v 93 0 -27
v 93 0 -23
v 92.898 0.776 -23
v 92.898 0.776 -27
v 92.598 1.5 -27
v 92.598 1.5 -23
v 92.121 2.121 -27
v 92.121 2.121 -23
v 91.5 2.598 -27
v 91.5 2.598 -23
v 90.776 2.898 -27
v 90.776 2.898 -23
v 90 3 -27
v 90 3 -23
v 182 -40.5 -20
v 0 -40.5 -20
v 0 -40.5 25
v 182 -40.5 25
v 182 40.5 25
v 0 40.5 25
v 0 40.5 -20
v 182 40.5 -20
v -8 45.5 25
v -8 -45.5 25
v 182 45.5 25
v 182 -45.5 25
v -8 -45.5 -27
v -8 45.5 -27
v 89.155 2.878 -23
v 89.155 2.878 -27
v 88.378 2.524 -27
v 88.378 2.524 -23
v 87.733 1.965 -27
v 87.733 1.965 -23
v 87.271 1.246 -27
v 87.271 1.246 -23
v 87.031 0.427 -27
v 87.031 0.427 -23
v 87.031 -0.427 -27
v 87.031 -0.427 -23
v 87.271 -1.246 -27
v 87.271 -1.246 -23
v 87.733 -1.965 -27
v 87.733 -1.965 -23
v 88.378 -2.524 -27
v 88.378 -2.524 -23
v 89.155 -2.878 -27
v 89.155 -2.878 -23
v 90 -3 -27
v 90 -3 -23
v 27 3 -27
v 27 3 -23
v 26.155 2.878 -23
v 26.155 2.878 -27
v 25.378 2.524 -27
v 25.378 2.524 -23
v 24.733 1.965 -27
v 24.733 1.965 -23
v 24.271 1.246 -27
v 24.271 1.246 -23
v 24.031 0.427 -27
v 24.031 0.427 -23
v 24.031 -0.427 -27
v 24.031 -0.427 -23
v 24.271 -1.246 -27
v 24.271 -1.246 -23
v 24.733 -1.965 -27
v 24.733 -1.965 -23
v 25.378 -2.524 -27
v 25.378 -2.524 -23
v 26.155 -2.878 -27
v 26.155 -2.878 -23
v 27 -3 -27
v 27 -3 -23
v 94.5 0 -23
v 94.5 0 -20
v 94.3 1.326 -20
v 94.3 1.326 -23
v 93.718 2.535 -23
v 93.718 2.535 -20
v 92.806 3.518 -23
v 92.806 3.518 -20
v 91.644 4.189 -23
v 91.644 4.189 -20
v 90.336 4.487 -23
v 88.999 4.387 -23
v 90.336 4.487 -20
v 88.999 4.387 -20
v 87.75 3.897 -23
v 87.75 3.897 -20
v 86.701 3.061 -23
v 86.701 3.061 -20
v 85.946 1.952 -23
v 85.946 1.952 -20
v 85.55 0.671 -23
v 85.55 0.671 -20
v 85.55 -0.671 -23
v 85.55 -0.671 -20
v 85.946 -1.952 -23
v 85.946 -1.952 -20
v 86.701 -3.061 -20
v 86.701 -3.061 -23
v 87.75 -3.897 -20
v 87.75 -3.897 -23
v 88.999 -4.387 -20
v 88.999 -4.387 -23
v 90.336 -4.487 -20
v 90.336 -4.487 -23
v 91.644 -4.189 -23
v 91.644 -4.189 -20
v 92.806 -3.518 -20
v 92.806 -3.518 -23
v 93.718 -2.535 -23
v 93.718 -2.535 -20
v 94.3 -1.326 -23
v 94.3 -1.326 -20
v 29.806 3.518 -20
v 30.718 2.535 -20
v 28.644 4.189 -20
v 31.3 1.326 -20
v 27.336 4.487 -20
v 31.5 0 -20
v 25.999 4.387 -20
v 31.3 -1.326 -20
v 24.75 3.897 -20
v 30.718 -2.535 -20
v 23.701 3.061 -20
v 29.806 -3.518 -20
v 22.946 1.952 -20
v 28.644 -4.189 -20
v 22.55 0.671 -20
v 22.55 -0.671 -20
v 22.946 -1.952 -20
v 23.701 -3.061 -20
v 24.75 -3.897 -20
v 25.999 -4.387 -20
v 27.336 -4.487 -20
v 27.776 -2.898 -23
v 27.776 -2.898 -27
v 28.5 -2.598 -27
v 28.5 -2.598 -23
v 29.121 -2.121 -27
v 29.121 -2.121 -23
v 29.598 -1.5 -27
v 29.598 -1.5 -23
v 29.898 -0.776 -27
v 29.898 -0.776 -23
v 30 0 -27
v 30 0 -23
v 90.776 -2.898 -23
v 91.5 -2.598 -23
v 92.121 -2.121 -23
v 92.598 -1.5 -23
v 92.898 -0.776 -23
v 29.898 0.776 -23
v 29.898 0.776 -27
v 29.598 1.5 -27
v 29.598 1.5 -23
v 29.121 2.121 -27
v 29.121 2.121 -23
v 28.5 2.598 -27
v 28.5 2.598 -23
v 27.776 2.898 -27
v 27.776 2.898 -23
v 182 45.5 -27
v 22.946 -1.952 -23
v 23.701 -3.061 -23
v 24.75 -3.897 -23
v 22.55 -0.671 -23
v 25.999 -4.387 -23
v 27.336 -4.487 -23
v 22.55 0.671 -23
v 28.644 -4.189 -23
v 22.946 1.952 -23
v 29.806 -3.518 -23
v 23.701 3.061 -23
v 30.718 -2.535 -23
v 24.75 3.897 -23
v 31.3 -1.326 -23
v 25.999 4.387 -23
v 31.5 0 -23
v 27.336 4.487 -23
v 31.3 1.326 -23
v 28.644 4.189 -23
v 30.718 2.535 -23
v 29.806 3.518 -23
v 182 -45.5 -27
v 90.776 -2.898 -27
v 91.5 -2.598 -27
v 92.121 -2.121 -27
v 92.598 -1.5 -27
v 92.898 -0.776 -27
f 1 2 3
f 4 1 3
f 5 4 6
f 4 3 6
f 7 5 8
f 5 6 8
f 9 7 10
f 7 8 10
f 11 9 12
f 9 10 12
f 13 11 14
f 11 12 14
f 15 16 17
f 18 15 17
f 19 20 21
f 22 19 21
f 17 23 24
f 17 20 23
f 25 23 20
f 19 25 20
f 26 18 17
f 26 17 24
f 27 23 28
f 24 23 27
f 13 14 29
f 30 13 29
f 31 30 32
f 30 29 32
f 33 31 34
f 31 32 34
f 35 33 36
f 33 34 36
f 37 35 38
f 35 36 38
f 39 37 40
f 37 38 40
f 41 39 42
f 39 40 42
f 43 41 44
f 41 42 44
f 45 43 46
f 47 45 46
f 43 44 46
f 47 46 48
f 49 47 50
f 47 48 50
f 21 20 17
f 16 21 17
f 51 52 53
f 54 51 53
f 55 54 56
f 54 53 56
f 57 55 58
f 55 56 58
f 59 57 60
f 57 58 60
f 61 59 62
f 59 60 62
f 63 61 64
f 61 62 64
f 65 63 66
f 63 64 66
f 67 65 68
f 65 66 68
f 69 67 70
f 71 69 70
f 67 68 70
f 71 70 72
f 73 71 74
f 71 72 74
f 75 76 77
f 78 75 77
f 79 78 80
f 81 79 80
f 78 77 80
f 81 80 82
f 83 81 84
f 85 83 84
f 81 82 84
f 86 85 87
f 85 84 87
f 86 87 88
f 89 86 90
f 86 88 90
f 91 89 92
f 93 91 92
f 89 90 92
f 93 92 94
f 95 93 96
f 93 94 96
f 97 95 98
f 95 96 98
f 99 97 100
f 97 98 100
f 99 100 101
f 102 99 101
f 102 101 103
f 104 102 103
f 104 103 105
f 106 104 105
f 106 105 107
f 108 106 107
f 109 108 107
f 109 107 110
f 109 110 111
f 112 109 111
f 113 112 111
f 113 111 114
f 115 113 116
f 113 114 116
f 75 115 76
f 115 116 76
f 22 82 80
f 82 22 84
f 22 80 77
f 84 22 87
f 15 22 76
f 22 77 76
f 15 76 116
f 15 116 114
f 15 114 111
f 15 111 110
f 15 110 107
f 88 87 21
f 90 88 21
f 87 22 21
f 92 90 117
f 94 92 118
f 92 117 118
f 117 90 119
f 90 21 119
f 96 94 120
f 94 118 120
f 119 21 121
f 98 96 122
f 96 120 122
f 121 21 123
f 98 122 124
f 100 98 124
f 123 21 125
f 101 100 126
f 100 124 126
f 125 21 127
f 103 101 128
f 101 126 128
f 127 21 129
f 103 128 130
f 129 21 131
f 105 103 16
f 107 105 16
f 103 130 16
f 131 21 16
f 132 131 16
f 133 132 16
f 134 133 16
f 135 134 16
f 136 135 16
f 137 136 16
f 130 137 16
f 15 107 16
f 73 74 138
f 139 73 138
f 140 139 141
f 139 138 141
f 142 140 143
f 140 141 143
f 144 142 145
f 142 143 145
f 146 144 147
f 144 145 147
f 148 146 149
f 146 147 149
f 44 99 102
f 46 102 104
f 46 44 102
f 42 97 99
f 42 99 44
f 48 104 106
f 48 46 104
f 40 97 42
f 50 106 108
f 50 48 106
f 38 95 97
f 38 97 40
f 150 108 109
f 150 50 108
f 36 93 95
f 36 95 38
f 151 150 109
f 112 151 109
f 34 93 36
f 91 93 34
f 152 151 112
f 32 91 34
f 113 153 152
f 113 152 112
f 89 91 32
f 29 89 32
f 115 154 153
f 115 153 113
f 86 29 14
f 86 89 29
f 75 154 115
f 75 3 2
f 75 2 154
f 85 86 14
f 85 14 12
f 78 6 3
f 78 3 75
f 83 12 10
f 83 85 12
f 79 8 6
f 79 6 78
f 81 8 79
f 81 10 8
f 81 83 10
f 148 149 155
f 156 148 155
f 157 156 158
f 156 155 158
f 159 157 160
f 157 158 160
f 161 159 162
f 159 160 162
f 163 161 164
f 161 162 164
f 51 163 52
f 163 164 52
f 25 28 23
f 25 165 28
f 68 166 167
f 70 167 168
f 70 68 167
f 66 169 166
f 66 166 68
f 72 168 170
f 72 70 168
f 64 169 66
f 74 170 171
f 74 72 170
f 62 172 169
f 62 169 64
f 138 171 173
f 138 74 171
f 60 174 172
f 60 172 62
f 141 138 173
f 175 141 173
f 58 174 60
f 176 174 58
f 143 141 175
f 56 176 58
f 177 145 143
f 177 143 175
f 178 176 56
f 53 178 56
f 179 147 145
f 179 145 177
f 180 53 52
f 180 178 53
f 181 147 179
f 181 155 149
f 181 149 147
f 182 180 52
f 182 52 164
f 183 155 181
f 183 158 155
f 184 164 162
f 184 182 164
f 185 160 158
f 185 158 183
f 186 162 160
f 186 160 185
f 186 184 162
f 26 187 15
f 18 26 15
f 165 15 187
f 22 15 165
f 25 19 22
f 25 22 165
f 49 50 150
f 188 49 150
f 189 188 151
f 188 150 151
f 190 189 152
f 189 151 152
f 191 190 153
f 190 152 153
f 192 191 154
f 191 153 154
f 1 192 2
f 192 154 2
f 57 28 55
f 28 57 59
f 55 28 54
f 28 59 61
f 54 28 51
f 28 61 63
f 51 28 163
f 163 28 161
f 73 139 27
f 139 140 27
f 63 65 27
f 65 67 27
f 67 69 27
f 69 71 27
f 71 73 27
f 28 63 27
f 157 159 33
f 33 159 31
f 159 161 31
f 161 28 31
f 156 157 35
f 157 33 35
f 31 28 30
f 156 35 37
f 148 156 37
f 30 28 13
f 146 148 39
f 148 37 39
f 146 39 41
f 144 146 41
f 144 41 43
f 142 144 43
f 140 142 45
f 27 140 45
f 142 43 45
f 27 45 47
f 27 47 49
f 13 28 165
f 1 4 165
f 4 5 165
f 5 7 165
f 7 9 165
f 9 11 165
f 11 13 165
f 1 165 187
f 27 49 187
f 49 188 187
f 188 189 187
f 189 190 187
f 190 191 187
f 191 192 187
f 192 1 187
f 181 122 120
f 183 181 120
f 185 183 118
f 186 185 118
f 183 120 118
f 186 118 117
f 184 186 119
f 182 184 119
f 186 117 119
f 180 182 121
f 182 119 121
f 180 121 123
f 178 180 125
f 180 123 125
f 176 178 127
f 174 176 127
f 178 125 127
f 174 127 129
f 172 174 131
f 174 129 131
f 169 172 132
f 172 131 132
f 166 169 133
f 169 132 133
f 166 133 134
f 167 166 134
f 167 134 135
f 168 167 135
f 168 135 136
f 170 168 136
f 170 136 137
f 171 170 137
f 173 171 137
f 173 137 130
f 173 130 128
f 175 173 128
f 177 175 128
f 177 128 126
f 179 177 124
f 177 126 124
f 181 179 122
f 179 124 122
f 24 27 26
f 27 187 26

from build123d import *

# Parameters (mm, degrees)
F1_DEPTH = 182
F2_W     = 91
F2_H     = 52
F3_DEPTH = 8
F5_DEPTH = 25
F6_R     = 4.5
F7_DEPTH = 3


with BuildPart() as f1:
    # F0 (on Right) → F1 (new body)
    with BuildSketch(Plane.YZ):
        Polygon((-0.5, -20), (-40.5, -20), (-40.5, 25), (-45.5, 25), (-45.5, -27), (45.5, -27), (45.5, 25), (40.5, 25), (40.5, -20), (0.5, -20), align=None)
    extrude(amount=F1_DEPTH)

    # F2 (on face) → F3 (join)
    with BuildSketch(Plane(origin=(0, 0, 0), x_dir=(0, -1, 0), z_dir=(-1, 0, 0))):
        with Locations((0, -1)):
            Rectangle(F2_W, F2_H)
    extrude(amount=F3_DEPTH)

    # F4 (on face) → F5 (cut)
    with BuildSketch(Plane.XY.offset(-20)):
        with BuildLine():
            ThreePointArc((30, 0), (29.12132, 2.12132), (27, 3))
            Line((27, 3), (27, -3))
            ThreePointArc((27, -3), (29.12132, -2.12132), (30, 0))
        make_face()
        with BuildLine():
            Line((27, -3), (27, 3))
            ThreePointArc((27, 3), (24, 0), (27, -3))
        make_face()
        with BuildLine():
            ThreePointArc((93, 0), (92.12132, 2.12132), (90, 3))
            Line((90, 3), (90, -3))
            ThreePointArc((90, -3), (92.12132, -2.12132), (93, 0))
        make_face()
        with BuildLine():
            Line((90, -3), (90, 3))
            ThreePointArc((90, 3), (87, 0), (90, -3))
        make_face()
    extrude(amount=-F5_DEPTH, mode=Mode.SUBTRACT)

    # F6 (on face) → F7 (cut)
    with BuildSketch(Plane.XY.offset(-20)):
        with Locations((27, 0)):
            Circle(F6_R)
        with Locations((90, 0)):
            Circle(F6_R)
    extrude(amount=-F7_DEPTH, mode=Mode.SUBTRACT)


solid = f1.part
